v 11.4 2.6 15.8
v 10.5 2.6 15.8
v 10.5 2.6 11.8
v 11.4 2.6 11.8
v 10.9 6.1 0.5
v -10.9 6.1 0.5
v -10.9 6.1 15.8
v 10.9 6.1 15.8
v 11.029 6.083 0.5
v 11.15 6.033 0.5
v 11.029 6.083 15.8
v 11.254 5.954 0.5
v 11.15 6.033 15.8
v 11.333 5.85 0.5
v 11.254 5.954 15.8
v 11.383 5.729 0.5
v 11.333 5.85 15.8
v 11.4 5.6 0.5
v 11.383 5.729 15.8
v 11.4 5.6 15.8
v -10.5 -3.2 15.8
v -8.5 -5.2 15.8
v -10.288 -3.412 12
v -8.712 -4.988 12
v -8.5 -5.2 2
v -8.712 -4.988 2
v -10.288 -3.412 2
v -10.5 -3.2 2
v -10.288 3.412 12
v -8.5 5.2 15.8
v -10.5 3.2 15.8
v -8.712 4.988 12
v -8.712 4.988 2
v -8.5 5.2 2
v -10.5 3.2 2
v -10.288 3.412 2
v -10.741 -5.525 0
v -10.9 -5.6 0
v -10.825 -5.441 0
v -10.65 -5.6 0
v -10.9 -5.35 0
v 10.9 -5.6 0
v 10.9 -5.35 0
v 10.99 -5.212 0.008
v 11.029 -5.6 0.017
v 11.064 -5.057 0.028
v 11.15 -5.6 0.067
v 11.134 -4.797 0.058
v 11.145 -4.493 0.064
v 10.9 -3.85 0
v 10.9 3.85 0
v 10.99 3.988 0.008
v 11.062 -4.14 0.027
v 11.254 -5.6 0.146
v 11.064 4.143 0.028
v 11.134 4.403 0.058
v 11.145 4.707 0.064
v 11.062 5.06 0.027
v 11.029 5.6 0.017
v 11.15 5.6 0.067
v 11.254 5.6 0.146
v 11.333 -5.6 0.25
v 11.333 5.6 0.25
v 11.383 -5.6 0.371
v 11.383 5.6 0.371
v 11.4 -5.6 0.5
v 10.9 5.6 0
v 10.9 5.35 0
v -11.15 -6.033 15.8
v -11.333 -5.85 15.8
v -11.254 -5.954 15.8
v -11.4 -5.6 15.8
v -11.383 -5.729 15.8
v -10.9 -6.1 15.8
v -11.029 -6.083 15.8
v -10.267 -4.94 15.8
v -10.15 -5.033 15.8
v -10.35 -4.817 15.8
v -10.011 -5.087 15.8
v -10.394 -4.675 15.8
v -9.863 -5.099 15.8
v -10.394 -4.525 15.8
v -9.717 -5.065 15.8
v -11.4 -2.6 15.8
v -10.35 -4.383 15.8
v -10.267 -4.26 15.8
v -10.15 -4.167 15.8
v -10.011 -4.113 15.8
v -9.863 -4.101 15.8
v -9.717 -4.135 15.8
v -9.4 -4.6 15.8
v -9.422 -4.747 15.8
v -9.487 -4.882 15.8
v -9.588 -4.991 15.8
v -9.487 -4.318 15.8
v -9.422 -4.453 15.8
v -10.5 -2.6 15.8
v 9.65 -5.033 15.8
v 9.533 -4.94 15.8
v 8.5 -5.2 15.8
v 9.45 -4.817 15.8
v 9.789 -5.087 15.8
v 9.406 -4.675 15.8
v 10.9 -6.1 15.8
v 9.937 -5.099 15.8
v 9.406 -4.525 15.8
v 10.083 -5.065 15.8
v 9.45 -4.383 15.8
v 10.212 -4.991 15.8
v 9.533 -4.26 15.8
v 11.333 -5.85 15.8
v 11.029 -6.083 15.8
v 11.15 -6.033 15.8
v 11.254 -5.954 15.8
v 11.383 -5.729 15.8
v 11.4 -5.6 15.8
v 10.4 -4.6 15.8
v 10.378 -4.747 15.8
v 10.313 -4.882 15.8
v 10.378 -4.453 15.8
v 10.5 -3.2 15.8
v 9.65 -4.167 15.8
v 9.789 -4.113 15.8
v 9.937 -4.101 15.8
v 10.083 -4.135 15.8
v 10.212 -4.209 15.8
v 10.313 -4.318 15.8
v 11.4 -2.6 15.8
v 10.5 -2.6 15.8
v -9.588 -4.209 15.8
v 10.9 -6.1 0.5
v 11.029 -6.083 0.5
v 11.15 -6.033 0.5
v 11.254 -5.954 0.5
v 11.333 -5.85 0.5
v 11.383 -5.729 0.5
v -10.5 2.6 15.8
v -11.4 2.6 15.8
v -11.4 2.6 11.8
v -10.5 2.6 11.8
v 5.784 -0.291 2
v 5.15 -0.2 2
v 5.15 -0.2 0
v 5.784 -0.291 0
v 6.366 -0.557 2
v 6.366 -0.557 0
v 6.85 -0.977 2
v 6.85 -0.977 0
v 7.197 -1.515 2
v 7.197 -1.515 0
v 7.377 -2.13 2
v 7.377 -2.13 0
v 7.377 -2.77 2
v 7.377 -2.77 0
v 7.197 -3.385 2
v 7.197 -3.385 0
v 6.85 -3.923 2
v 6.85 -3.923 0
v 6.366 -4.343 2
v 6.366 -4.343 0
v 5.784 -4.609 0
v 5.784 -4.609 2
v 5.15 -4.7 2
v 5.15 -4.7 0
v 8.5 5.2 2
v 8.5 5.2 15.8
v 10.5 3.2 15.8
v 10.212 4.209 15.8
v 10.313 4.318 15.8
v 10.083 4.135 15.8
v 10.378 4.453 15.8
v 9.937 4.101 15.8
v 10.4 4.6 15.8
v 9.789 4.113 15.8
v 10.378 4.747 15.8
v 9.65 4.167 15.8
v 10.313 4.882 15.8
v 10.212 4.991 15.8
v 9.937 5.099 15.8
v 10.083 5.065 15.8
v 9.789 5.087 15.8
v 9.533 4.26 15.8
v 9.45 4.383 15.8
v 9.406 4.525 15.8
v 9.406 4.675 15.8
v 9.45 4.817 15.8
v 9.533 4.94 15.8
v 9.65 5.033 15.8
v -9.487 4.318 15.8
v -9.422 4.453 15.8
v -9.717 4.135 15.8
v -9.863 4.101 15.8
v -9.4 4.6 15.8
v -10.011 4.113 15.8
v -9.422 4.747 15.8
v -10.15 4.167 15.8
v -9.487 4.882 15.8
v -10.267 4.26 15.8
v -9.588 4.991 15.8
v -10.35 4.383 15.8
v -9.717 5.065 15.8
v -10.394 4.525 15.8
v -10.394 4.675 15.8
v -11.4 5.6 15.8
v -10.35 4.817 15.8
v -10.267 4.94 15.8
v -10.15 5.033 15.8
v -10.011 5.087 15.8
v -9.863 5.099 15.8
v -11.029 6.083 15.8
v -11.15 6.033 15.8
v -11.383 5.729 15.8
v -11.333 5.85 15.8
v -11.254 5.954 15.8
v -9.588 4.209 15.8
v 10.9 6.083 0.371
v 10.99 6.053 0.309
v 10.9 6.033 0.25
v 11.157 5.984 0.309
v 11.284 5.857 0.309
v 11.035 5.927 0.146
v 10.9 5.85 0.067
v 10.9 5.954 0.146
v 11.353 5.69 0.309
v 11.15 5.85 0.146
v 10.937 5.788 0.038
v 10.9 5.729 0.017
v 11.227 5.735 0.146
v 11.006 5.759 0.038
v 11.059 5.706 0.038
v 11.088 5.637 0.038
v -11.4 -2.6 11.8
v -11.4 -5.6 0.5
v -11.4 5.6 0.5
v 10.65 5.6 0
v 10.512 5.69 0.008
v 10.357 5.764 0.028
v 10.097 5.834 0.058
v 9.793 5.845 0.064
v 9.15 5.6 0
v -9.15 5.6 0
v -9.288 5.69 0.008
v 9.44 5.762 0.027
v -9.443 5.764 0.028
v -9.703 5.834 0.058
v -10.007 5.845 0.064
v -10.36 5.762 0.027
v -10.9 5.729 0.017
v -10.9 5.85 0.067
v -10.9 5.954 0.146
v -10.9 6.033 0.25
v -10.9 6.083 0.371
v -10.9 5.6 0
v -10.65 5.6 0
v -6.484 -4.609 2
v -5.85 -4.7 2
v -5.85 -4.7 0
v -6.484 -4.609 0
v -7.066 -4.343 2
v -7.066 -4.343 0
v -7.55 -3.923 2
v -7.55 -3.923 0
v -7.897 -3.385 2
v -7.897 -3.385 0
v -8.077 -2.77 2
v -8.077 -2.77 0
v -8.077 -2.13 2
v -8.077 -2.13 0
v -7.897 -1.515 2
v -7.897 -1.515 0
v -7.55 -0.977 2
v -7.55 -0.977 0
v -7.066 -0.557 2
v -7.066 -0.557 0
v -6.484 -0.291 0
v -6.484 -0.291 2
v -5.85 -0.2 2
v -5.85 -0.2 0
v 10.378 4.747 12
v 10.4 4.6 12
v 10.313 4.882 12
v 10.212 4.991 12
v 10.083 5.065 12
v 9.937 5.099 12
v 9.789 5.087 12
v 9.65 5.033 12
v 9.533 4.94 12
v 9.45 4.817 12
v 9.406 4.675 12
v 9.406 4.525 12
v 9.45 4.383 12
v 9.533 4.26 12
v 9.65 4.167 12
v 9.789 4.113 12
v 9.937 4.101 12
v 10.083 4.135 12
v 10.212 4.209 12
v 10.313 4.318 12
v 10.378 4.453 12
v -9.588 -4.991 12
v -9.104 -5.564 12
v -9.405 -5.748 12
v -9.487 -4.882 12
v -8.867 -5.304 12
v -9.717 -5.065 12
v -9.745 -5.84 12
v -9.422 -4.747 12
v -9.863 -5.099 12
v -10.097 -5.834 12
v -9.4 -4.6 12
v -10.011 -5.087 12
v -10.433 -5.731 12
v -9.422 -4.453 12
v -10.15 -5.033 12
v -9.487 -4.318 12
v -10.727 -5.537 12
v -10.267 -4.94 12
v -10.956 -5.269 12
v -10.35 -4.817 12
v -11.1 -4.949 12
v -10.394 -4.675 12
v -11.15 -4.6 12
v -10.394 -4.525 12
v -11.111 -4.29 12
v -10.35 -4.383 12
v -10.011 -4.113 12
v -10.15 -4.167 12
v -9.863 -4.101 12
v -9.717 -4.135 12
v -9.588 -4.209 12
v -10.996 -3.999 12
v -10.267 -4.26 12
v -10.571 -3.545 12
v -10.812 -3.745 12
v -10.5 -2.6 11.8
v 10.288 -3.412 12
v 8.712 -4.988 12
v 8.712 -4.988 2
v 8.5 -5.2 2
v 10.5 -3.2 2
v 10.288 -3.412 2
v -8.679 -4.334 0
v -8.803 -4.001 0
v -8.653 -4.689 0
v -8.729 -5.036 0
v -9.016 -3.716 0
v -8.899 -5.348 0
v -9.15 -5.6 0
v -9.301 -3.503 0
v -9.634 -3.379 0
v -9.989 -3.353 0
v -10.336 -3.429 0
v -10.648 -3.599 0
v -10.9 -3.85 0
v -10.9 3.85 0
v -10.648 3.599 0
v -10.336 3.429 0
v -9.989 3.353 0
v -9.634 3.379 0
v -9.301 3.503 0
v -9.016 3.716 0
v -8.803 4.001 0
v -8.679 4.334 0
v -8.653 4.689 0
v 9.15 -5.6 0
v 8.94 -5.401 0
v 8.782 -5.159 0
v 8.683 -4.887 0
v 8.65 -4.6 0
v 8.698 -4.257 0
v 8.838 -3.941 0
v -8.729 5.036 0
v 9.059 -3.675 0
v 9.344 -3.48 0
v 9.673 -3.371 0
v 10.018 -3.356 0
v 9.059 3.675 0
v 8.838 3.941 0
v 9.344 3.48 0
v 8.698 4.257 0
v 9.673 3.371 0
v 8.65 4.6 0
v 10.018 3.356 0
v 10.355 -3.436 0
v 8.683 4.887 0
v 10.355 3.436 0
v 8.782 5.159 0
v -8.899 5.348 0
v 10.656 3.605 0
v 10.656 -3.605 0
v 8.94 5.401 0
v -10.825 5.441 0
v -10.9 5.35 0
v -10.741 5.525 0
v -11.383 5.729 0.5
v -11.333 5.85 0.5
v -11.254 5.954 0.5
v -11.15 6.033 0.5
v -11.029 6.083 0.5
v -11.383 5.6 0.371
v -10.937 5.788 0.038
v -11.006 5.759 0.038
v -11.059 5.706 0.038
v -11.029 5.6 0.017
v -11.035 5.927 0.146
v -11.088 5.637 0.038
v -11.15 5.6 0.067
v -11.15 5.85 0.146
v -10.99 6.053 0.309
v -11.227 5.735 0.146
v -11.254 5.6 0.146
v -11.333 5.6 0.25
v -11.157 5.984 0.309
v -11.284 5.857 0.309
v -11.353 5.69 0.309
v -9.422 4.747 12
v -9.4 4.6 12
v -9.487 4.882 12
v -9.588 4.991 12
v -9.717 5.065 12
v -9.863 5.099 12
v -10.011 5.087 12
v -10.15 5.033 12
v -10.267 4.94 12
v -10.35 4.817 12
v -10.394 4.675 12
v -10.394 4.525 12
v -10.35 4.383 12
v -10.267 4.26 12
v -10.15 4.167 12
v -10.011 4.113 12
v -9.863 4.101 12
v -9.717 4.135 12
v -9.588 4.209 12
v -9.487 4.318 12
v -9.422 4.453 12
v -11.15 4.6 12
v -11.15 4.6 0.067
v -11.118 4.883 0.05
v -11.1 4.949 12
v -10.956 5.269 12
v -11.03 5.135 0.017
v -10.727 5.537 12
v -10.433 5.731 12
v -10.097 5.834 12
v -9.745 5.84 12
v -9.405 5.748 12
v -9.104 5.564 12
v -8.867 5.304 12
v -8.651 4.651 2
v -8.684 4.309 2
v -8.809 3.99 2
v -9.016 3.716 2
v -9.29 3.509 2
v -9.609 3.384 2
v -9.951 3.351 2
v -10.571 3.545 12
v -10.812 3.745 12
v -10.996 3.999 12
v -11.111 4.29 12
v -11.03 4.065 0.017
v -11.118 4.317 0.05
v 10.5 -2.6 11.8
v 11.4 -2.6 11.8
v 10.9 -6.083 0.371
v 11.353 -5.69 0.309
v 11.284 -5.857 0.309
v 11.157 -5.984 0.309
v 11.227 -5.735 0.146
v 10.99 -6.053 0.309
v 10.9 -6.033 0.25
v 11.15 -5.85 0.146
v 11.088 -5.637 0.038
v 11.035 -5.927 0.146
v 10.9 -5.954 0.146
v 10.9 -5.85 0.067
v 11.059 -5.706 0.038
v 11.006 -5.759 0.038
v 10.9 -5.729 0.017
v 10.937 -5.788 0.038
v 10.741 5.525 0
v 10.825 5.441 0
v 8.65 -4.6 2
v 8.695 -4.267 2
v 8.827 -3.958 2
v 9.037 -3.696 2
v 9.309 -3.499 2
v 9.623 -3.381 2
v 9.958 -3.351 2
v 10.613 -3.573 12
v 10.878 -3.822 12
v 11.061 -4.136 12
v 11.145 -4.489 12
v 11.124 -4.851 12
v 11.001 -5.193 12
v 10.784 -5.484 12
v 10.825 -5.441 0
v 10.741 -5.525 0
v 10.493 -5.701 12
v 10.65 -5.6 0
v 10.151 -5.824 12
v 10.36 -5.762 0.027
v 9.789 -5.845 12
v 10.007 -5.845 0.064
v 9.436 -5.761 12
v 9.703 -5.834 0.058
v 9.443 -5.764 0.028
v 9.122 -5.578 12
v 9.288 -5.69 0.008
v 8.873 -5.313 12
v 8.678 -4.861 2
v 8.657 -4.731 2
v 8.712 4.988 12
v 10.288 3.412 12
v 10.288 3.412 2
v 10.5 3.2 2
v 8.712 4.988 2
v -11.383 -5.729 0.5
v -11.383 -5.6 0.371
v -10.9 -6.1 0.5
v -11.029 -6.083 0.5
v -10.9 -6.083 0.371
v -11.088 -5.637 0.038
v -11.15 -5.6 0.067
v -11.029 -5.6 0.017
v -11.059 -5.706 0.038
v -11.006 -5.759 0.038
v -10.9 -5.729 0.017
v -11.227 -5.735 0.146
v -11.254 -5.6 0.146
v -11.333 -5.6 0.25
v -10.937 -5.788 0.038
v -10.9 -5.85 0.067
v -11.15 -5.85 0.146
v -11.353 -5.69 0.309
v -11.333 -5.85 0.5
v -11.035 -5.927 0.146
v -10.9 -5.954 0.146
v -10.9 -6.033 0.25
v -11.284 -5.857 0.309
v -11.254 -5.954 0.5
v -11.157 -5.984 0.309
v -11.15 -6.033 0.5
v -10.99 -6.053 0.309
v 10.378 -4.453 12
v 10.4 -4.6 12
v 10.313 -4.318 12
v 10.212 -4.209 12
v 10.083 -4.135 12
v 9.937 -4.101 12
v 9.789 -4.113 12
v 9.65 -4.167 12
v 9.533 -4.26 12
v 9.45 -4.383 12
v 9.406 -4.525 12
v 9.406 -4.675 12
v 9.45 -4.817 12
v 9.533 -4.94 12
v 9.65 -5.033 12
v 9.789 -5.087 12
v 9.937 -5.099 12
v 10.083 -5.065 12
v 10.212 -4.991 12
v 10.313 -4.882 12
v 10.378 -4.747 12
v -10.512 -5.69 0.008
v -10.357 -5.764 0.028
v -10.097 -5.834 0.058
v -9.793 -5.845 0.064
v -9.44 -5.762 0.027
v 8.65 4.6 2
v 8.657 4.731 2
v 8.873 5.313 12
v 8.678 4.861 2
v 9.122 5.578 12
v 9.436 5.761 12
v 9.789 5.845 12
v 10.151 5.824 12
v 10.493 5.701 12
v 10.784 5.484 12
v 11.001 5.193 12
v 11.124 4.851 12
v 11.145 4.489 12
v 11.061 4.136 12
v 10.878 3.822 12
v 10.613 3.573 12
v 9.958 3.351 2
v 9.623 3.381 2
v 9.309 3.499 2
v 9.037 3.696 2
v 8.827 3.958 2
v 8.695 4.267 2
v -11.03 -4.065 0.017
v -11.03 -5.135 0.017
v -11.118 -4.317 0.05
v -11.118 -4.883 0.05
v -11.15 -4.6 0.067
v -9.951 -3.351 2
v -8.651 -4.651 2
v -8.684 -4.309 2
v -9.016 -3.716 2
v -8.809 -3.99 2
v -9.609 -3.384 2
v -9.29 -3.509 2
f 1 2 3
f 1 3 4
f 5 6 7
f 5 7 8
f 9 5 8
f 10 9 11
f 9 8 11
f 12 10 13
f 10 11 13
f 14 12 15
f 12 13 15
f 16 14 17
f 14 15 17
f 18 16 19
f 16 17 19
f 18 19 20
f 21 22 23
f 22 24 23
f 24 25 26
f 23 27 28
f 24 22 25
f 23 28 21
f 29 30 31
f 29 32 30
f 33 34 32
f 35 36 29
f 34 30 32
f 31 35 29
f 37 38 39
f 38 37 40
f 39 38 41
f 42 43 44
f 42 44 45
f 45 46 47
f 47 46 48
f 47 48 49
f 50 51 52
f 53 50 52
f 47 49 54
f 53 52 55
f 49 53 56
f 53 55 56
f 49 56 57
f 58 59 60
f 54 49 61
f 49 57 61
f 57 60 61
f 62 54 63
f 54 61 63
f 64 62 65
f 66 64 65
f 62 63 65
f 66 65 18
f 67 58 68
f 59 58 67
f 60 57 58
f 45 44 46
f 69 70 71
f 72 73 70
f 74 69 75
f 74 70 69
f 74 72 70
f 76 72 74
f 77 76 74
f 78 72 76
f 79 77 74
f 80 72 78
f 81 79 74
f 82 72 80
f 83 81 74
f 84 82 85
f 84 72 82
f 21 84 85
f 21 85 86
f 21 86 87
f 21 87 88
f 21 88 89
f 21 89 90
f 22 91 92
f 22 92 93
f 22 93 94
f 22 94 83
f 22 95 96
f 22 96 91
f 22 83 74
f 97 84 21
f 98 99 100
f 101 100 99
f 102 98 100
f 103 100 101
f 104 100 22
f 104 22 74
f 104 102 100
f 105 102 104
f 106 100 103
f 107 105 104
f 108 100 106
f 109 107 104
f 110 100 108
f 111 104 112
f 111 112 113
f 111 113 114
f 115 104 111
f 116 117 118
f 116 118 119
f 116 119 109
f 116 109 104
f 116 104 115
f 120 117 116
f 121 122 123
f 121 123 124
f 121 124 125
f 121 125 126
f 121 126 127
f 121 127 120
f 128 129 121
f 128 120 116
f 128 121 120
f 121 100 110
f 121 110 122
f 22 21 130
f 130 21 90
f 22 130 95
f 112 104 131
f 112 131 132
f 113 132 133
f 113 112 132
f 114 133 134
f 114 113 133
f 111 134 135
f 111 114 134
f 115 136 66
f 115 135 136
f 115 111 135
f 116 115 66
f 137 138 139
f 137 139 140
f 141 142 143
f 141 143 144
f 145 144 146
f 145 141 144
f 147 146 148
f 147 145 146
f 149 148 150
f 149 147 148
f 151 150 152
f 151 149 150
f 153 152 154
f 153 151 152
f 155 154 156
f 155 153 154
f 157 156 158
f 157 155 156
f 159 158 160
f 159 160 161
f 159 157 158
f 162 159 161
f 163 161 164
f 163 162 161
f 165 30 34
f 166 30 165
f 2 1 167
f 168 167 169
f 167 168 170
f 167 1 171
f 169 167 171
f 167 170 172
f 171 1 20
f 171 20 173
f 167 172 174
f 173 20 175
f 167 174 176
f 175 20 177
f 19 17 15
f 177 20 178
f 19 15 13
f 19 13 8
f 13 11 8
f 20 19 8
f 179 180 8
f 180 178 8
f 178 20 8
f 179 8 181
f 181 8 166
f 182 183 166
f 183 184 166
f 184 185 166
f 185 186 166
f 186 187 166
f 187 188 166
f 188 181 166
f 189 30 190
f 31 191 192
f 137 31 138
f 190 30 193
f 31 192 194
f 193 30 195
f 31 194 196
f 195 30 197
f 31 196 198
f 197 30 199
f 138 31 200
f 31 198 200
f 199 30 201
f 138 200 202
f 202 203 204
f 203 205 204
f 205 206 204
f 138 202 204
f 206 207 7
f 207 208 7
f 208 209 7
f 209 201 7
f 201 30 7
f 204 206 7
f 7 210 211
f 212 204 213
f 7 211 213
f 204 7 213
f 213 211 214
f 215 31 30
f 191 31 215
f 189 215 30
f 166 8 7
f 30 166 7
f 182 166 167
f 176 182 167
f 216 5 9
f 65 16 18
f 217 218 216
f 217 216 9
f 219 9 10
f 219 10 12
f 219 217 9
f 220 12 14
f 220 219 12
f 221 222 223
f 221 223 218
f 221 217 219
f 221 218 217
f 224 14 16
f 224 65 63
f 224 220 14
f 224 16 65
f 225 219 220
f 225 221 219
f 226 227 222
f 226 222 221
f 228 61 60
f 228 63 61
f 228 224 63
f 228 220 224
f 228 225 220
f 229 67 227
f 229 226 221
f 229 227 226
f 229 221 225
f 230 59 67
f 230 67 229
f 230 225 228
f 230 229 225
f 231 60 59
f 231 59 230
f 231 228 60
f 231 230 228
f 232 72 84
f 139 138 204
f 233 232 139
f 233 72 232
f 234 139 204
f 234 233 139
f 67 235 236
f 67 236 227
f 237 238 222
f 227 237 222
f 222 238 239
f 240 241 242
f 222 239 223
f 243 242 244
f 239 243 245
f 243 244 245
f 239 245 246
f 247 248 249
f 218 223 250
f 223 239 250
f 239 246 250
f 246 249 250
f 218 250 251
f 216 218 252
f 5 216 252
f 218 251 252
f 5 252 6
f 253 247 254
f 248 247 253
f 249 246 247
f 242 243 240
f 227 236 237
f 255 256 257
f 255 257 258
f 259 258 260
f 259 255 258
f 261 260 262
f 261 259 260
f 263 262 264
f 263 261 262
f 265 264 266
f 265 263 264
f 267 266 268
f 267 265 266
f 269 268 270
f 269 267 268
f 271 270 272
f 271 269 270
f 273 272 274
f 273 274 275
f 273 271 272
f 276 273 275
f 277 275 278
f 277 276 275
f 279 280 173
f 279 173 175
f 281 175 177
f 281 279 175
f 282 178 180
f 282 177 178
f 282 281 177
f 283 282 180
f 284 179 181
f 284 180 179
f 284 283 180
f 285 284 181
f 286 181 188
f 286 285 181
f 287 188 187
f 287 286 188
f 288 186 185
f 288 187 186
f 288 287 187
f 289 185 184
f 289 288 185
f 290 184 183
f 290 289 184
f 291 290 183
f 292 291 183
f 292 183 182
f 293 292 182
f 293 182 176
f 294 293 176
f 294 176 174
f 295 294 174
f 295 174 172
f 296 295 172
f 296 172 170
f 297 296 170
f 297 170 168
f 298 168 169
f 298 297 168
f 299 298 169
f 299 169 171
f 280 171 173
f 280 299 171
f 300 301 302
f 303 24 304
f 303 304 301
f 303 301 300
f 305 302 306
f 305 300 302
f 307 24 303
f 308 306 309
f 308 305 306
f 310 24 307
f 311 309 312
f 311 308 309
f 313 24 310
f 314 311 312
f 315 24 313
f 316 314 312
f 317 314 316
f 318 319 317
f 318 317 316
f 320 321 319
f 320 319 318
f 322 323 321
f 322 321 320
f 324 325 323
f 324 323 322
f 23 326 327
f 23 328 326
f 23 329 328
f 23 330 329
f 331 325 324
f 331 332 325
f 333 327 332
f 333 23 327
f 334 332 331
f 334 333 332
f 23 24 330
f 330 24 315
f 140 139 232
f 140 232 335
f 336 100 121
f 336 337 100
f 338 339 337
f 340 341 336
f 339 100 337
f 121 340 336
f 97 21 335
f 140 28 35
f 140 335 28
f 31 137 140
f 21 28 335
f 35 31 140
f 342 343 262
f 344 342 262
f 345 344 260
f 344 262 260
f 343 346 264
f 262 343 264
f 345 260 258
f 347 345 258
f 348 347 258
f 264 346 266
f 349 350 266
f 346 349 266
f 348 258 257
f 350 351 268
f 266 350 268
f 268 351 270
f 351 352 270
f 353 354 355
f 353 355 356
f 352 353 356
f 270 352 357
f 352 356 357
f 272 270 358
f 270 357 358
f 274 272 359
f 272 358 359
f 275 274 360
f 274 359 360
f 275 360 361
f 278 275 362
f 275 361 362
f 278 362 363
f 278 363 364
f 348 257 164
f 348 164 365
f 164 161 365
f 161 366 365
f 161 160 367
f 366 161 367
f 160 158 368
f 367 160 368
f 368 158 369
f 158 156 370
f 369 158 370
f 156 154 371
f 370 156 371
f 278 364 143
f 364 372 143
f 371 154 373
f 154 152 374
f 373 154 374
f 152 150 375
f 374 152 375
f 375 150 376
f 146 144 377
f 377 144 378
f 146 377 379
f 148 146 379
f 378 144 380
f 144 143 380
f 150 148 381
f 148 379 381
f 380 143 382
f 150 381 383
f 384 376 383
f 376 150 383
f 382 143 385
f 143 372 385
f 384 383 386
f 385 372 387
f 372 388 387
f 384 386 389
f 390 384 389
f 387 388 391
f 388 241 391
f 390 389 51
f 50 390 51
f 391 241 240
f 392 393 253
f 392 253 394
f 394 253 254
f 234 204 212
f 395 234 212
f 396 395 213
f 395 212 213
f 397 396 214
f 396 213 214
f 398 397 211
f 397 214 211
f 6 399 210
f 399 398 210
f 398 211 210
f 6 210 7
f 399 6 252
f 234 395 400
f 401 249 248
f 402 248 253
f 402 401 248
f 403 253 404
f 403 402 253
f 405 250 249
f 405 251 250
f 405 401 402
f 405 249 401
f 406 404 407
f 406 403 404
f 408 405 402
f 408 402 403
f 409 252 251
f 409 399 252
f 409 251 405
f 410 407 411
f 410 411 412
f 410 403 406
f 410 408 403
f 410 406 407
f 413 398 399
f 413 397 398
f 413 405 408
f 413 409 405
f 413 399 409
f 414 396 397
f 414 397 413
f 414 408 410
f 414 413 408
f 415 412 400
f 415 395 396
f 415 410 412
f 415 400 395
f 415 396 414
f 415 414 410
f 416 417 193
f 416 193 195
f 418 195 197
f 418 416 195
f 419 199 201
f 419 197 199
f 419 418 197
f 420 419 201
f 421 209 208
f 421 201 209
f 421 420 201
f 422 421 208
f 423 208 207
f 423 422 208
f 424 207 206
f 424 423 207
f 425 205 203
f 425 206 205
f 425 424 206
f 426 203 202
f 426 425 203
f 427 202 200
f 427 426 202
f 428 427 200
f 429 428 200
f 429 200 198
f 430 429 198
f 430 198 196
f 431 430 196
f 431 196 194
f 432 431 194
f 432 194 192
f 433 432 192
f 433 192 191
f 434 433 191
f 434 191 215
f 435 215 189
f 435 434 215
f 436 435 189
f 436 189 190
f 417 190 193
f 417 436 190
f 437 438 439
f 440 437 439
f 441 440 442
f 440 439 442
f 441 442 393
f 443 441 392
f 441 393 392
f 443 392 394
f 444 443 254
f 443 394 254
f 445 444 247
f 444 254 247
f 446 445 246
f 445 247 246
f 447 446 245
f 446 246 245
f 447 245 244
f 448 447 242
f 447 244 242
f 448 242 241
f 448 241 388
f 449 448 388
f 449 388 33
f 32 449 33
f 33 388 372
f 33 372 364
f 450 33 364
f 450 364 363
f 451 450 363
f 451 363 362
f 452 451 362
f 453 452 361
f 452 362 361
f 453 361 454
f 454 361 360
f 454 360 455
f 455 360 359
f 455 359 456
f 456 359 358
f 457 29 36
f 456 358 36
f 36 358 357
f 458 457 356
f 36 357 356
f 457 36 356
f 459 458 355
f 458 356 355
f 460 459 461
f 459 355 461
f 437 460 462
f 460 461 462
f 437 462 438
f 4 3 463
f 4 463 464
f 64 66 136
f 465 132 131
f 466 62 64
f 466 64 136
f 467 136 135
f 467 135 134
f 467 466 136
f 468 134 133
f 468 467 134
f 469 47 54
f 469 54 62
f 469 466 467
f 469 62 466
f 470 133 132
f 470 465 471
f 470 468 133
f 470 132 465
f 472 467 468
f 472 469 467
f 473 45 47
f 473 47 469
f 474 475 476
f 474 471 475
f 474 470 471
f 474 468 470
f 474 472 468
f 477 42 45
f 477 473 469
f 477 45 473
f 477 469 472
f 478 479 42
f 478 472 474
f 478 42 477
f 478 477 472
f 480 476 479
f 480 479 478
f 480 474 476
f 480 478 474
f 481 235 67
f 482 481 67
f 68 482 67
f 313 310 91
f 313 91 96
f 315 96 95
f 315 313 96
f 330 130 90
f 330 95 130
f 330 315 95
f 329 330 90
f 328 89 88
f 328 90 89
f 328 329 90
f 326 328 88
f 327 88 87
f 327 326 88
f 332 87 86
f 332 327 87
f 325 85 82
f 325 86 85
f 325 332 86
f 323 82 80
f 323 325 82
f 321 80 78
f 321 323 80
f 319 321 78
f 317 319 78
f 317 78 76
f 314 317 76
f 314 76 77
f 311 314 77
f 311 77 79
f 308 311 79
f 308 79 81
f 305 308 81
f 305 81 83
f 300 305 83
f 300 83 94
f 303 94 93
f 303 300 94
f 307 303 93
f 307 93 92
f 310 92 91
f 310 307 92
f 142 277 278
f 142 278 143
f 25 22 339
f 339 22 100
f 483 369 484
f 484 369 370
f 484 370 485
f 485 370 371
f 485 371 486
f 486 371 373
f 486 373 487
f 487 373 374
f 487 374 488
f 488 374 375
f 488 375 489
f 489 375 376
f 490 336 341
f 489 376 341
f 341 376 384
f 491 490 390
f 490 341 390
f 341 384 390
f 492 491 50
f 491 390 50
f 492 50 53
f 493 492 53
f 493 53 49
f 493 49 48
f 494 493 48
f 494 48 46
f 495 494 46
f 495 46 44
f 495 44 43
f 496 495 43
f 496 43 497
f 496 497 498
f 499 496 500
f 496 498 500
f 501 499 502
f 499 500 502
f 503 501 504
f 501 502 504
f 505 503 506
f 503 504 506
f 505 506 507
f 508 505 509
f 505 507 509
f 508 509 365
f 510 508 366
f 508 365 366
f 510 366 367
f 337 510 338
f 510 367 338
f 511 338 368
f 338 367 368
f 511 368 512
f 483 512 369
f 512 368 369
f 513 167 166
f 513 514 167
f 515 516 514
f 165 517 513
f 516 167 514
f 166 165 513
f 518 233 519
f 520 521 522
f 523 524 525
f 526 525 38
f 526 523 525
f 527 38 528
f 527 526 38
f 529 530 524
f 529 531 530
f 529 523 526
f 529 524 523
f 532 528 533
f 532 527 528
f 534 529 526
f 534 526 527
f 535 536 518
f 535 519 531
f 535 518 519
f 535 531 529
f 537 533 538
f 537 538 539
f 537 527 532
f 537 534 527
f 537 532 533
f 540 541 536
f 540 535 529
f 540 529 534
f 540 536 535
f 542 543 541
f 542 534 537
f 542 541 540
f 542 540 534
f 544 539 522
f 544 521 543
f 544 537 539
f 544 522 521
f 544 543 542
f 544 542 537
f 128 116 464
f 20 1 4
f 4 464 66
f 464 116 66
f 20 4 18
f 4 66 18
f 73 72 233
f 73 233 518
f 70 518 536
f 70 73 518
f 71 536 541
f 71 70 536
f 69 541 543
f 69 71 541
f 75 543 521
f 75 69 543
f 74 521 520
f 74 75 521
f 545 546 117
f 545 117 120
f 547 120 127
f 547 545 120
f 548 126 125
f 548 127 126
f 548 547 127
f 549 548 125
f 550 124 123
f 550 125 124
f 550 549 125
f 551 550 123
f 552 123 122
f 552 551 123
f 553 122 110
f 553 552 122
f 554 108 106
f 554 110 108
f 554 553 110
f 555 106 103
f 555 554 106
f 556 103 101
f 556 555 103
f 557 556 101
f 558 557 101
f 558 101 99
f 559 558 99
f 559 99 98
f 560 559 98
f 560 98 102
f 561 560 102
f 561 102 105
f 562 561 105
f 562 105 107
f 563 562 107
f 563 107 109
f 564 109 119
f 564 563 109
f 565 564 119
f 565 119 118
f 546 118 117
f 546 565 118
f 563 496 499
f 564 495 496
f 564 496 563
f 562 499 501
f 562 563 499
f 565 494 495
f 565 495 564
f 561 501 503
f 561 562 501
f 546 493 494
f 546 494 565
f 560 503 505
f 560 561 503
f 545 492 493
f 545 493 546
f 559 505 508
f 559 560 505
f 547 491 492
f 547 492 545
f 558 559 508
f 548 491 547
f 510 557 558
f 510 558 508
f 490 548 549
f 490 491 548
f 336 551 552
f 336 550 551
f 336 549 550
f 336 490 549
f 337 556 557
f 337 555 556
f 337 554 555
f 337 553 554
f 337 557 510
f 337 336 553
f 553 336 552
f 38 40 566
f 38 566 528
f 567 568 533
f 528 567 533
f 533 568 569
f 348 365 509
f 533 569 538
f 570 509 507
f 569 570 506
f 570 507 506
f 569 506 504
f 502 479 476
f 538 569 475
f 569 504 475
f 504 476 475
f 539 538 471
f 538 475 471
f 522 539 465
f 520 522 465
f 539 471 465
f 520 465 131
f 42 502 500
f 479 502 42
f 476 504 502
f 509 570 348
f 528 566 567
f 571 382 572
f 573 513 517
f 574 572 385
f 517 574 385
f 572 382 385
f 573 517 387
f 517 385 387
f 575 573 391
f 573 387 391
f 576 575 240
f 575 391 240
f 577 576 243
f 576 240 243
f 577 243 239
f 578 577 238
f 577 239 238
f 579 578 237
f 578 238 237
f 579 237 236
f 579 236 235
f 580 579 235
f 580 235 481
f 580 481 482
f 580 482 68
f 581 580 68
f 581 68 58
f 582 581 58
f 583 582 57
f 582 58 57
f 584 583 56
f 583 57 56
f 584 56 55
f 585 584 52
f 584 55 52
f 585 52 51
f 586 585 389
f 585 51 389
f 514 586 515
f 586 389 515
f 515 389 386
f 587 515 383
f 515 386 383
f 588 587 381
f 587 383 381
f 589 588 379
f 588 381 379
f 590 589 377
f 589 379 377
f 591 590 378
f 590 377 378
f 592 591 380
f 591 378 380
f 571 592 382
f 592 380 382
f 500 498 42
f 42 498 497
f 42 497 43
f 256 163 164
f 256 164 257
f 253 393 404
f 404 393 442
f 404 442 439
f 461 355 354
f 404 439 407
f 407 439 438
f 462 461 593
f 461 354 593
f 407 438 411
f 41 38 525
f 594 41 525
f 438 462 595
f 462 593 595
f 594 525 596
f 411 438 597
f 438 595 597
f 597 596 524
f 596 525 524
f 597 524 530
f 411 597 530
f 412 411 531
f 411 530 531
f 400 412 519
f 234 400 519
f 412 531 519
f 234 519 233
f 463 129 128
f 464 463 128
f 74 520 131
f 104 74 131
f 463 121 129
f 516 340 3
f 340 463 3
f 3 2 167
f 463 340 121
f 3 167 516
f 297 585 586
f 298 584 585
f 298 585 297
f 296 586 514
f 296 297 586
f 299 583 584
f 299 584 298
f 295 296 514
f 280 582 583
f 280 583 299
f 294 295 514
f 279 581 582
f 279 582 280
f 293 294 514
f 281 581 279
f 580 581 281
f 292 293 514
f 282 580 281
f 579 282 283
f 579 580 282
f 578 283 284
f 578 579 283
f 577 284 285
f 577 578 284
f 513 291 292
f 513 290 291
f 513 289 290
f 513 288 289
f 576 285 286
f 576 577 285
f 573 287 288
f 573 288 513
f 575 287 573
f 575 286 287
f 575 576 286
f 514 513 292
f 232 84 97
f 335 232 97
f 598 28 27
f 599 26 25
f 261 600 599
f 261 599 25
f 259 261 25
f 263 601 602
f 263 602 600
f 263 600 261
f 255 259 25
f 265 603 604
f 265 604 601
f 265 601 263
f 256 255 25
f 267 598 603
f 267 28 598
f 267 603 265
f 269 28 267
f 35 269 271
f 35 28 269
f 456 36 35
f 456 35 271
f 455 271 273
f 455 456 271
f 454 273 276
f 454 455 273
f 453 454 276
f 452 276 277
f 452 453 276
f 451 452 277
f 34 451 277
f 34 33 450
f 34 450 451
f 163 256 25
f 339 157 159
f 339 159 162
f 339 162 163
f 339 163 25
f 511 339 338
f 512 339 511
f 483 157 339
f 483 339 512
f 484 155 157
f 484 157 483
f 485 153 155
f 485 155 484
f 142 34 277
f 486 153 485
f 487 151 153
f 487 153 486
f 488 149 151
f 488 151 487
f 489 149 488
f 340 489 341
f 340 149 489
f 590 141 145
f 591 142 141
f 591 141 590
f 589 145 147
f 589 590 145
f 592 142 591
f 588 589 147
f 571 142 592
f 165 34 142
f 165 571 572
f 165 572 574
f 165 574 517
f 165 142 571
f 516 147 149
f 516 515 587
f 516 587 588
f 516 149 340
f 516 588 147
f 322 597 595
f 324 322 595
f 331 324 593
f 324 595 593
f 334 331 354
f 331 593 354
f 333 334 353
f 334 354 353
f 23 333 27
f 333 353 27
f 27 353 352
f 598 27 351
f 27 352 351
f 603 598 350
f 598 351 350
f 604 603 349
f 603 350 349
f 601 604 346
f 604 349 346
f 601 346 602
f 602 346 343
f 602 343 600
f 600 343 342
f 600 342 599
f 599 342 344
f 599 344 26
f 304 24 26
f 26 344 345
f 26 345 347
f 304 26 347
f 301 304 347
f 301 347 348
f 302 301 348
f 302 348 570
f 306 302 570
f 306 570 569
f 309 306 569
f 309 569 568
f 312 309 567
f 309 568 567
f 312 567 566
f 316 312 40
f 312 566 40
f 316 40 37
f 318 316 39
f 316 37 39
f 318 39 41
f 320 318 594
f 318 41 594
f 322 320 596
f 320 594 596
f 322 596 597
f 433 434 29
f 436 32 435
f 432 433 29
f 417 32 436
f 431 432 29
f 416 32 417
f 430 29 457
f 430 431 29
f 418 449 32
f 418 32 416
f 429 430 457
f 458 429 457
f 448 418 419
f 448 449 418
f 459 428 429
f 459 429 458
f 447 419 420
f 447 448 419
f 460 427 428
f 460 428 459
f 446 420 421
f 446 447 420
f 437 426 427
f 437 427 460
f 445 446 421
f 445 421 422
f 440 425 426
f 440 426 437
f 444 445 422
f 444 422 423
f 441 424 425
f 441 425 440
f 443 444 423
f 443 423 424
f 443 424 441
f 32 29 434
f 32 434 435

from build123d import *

# Parameters (mm, degrees)
SKETCH_1_W               = 22.8
SKETCH_1_H               = 12.2
EXTRUDE_1_DEPTH          = 15.8
SKETCH_2_W               = 21
SKETCH_2_H               = 10.4
CUT_EXTRUDE_1_DEPTH      = 13.8
SKETCH_4_W               = 0.9
SKETCH_4_H               = 5.2
CUT_EXTRUDE_2_DEPTH      = 4
CUT_EXTRUDE_5_DEPTH      = 2
FILLET_2_R               = 0.5
SKETCH_8_W               = 0.9
SKETCH_8_H               = 5.2
CUT_EXTRUDE_6_DEPTH      = 4
EXTRUDE_2_DEPTH          = 13.8
CUT_EXTRUDE_8_DEPTH      = 19.91057905
CUT_EXTRUDE_8_DEPTH_BACK = 19.91057905
SKETCH_3_R               = 0.5
SKETCH_9_R               = 1.25
CUT_EXTRUDE_9_DEPTH      = 12
FILLET_3_R               = 0.5


with BuildPart() as part:
    # 草图1 → 凸台-拉伸1 (new body)
    with BuildSketch(Plane.XY):
        Rectangle(SKETCH_1_W, SKETCH_1_H)
    extrude(amount=EXTRUDE_1_DEPTH)

    # 草图2 → 切除-拉伸1 (cut)
    with BuildSketch(Plane.XY.offset(15.8)):
        Rectangle(SKETCH_2_W, SKETCH_2_H)
    extrude(amount=-CUT_EXTRUDE_1_DEPTH, mode=Mode.SUBTRACT)

    # 草图4 → 切除-拉伸2 (cut)
    with BuildSketch(Plane.XY.offset(15.8)):
        with Locations((-10.95, 0)):
            Rectangle(SKETCH_4_W, SKETCH_4_H)
    extrude(amount=-CUT_EXTRUDE_2_DEPTH, mode=Mode.SUBTRACT)

    # 草图7 → 切除-拉伸5 (cut)
    with BuildSketch(Plane.XY.offset(2)):
        with BuildLine():
            Line((-5.85, -0.2), (5.15, -0.2))
            ThreePointArc((5.15, -0.2), (7.4, -2.45), (5.15, -4.7))
            Line((5.15, -4.7), (-5.85, -4.7))
            ThreePointArc((-5.85, -4.7), (-8.1, -2.45), (-5.85, -0.2))
        make_face()
    extrude(amount=-CUT_EXTRUDE_5_DEPTH, mode=Mode.SUBTRACT)

    # 圆角2
    fillet_2_edges = [part.edges().sort_by_distance(p)[0] for p in [
        (11.4, -6.1, 7.9),
        (-11.4, -6.1, 7.9),
        (-11.4, 6.1, 7.9),
        (11.4, 6.1, 7.9),
    ]]
    fillet(fillet_2_edges, radius=FILLET_2_R)

    # 草图8 → 切除-拉伸6 (cut)
    with BuildSketch(Plane.XY.offset(15.8)):
        with Locations((10.95, 0)):
            Rectangle(SKETCH_8_W, SKETCH_8_H)
    extrude(amount=-CUT_EXTRUDE_6_DEPTH, mode=Mode.SUBTRACT)

    # 草图10 → 凸台-拉伸2 (add)
    with BuildSketch(Plane.XY.offset(2)):
        Polygon((-10.5, 3.2), (-10.5, 5.2), (-8.5, 5.2), align=None)
        Polygon((8.5, 5.2), (10.5, 5.2), (10.5, 3.2), align=None)
        Polygon((10.5, -3.2), (10.5, -5.2), (8.5, -5.2), align=None)
        Polygon((-10.5, -3.2), (-10.5, -5.2), (-8.5, -5.2), align=None)
    extrude(amount=EXTRUDE_2_DEPTH)

    # 草图3 → 切除-拉伸8 (cut, two sides: drawn at the far end of the back side and taken through both)
    with BuildSketch(Plane.XY.offset(2).offset(-CUT_EXTRUDE_8_DEPTH_BACK)):
        with Locations((9.9, 4.6)):
            Circle(SKETCH_3_R)
        with Locations((-9.9, -4.6)):
            Circle(SKETCH_3_R)
        with Locations((9.9, -4.6)):
            Circle(SKETCH_3_R)
        with Locations((-9.9, 4.6)):
            Circle(SKETCH_3_R)
    extrude(amount=CUT_EXTRUDE_8_DEPTH + CUT_EXTRUDE_8_DEPTH_BACK, mode=Mode.SUBTRACT)

    # 草图9 → 切除-拉伸9 (cut)
    with BuildSketch(Plane(origin=(0, 0, 0), x_dir=(-1, 0, 0), z_dir=(0, 0, -1))):
        with Locations((-9.9, 4.6)):
            Circle(SKETCH_9_R)
        with Locations((9.9, 4.6)):
            Circle(SKETCH_9_R)
        with Locations((-9.9, -4.6)):
            Circle(SKETCH_9_R)
        with Locations((9.9, -4.6)):
            Circle(SKETCH_9_R)
    extrude(amount=-CUT_EXTRUDE_9_DEPTH, mode=Mode.SUBTRACT)

    # 圆角3
    # the kernel refuses this fillet: 0.5 mm, written as the material it takes off along each edge
    with BuildSketch(Plane(origin=(-10.9, 6.1, 0), x_dir=(0, 0, 1), z_dir=(1, 0, 0))) as fillet_3_piece_1:
        with BuildLine():
            CenterArc((FILLET_3_R, FILLET_3_R), FILLET_3_R, 180, 90)
            Line((0, FILLET_3_R), (0, 0))
            Line((0, 0), (FILLET_3_R, 0))
        make_face()
    extrude(amount=21.8, mode=Mode.SUBTRACT)
    with BuildSketch(Plane(origin=(11.4, 5.6, 0), x_dir=(-1, 0, 0), z_dir=(0, -1, 0)), Plane(origin=(-11.4, -5.6, 0), x_dir=(1, 0, 0), z_dir=(0, 1, 0))) as fillet_3_piece_2:
        with BuildLine():
            CenterArc((FILLET_3_R, -FILLET_3_R), FILLET_3_R, 90, 90)
            Line((0, -FILLET_3_R), (0, 0))
            Line((0, 0), (FILLET_3_R, 0))
        make_face()
    extrude(amount=11.2, mode=Mode.SUBTRACT)
    with BuildSketch(Plane(origin=(10.9, -6.1, 0), x_dir=(0, 1, 0), z_dir=(-1, 0, 0))) as fillet_3_piece_3:
        with BuildLine():
            CenterArc((FILLET_3_R, -FILLET_3_R), FILLET_3_R, 90, 90)
            Line((0, -FILLET_3_R), (0, 0))
            Line((0, 0), (FILLET_3_R, 0))
        make_face()
    extrude(amount=21.8, mode=Mode.SUBTRACT)
    with BuildSketch(Plane(origin=(-10.9, 5.6, 0), x_dir=(0, 1, 0), z_dir=(1, 0, 0))) as fillet_3_piece_4:
        with BuildLine():
            CenterArc((0.5 - FILLET_3_R, FILLET_3_R), FILLET_3_R, 270, 90)
            Line((0.5, FILLET_3_R), (0.5, 0))
            Line((0.5, 0), (0.5 - FILLET_3_R, 0))
        make_face()
    revolve(axis=Axis((-10.9, 5.6, 0), (0, 0, 1)), revolution_arc=90, mode=Mode.SUBTRACT)
    with BuildSketch(Plane(origin=(-10.9, -5.6, 0), x_dir=(-1, 0, 0), z_dir=(0, 1, 0))) as fillet_3_piece_5:
        with BuildLine():
            CenterArc((0.5 - FILLET_3_R, FILLET_3_R), FILLET_3_R, 270, 90)
            Line((0.5, FILLET_3_R), (0.5, 0))
            Line((0.5, 0), (0.5 - FILLET_3_R, 0))
        make_face()
    revolve(axis=Axis((-10.9, -5.6, 0), (0, 0, 1)), revolution_arc=90, mode=Mode.SUBTRACT)
    with BuildSketch(Plane(origin=(10.9, -5.6, 0), x_dir=(1, 0, 0), z_dir=(0, 1, 0))) as fillet_3_piece_6:
        with BuildLine():
            CenterArc((0.5 - FILLET_3_R, -FILLET_3_R), FILLET_3_R, 0, 90)
            Line((0.5, -FILLET_3_R), (0.5, 0))
            Line((0.5, 0), (0.5 - FILLET_3_R, 0))
        make_face()
    revolve(axis=Axis((10.9, -5.6, 0), (0, 0, -1)), revolution_arc=90, mode=Mode.SUBTRACT)
    with BuildSketch(Plane(origin=(10.9, 5.6, 0), x_dir=(0, 1, 0), z_dir=(-1, 0, 0))) as fillet_3_piece_7:
        with BuildLine():
            CenterArc((0.5 - FILLET_3_R, -FILLET_3_R), FILLET_3_R, 0, 90)
            Line((0.5, -FILLET_3_R), (0.5, 0))
            Line((0.5, 0), (0.5 - FILLET_3_R, 0))
        make_face()
    revolve(axis=Axis((10.9, 5.6, 0), (0, 0, -1)), revolution_arc=90, mode=Mode.SUBTRACT)


solid = part.part
